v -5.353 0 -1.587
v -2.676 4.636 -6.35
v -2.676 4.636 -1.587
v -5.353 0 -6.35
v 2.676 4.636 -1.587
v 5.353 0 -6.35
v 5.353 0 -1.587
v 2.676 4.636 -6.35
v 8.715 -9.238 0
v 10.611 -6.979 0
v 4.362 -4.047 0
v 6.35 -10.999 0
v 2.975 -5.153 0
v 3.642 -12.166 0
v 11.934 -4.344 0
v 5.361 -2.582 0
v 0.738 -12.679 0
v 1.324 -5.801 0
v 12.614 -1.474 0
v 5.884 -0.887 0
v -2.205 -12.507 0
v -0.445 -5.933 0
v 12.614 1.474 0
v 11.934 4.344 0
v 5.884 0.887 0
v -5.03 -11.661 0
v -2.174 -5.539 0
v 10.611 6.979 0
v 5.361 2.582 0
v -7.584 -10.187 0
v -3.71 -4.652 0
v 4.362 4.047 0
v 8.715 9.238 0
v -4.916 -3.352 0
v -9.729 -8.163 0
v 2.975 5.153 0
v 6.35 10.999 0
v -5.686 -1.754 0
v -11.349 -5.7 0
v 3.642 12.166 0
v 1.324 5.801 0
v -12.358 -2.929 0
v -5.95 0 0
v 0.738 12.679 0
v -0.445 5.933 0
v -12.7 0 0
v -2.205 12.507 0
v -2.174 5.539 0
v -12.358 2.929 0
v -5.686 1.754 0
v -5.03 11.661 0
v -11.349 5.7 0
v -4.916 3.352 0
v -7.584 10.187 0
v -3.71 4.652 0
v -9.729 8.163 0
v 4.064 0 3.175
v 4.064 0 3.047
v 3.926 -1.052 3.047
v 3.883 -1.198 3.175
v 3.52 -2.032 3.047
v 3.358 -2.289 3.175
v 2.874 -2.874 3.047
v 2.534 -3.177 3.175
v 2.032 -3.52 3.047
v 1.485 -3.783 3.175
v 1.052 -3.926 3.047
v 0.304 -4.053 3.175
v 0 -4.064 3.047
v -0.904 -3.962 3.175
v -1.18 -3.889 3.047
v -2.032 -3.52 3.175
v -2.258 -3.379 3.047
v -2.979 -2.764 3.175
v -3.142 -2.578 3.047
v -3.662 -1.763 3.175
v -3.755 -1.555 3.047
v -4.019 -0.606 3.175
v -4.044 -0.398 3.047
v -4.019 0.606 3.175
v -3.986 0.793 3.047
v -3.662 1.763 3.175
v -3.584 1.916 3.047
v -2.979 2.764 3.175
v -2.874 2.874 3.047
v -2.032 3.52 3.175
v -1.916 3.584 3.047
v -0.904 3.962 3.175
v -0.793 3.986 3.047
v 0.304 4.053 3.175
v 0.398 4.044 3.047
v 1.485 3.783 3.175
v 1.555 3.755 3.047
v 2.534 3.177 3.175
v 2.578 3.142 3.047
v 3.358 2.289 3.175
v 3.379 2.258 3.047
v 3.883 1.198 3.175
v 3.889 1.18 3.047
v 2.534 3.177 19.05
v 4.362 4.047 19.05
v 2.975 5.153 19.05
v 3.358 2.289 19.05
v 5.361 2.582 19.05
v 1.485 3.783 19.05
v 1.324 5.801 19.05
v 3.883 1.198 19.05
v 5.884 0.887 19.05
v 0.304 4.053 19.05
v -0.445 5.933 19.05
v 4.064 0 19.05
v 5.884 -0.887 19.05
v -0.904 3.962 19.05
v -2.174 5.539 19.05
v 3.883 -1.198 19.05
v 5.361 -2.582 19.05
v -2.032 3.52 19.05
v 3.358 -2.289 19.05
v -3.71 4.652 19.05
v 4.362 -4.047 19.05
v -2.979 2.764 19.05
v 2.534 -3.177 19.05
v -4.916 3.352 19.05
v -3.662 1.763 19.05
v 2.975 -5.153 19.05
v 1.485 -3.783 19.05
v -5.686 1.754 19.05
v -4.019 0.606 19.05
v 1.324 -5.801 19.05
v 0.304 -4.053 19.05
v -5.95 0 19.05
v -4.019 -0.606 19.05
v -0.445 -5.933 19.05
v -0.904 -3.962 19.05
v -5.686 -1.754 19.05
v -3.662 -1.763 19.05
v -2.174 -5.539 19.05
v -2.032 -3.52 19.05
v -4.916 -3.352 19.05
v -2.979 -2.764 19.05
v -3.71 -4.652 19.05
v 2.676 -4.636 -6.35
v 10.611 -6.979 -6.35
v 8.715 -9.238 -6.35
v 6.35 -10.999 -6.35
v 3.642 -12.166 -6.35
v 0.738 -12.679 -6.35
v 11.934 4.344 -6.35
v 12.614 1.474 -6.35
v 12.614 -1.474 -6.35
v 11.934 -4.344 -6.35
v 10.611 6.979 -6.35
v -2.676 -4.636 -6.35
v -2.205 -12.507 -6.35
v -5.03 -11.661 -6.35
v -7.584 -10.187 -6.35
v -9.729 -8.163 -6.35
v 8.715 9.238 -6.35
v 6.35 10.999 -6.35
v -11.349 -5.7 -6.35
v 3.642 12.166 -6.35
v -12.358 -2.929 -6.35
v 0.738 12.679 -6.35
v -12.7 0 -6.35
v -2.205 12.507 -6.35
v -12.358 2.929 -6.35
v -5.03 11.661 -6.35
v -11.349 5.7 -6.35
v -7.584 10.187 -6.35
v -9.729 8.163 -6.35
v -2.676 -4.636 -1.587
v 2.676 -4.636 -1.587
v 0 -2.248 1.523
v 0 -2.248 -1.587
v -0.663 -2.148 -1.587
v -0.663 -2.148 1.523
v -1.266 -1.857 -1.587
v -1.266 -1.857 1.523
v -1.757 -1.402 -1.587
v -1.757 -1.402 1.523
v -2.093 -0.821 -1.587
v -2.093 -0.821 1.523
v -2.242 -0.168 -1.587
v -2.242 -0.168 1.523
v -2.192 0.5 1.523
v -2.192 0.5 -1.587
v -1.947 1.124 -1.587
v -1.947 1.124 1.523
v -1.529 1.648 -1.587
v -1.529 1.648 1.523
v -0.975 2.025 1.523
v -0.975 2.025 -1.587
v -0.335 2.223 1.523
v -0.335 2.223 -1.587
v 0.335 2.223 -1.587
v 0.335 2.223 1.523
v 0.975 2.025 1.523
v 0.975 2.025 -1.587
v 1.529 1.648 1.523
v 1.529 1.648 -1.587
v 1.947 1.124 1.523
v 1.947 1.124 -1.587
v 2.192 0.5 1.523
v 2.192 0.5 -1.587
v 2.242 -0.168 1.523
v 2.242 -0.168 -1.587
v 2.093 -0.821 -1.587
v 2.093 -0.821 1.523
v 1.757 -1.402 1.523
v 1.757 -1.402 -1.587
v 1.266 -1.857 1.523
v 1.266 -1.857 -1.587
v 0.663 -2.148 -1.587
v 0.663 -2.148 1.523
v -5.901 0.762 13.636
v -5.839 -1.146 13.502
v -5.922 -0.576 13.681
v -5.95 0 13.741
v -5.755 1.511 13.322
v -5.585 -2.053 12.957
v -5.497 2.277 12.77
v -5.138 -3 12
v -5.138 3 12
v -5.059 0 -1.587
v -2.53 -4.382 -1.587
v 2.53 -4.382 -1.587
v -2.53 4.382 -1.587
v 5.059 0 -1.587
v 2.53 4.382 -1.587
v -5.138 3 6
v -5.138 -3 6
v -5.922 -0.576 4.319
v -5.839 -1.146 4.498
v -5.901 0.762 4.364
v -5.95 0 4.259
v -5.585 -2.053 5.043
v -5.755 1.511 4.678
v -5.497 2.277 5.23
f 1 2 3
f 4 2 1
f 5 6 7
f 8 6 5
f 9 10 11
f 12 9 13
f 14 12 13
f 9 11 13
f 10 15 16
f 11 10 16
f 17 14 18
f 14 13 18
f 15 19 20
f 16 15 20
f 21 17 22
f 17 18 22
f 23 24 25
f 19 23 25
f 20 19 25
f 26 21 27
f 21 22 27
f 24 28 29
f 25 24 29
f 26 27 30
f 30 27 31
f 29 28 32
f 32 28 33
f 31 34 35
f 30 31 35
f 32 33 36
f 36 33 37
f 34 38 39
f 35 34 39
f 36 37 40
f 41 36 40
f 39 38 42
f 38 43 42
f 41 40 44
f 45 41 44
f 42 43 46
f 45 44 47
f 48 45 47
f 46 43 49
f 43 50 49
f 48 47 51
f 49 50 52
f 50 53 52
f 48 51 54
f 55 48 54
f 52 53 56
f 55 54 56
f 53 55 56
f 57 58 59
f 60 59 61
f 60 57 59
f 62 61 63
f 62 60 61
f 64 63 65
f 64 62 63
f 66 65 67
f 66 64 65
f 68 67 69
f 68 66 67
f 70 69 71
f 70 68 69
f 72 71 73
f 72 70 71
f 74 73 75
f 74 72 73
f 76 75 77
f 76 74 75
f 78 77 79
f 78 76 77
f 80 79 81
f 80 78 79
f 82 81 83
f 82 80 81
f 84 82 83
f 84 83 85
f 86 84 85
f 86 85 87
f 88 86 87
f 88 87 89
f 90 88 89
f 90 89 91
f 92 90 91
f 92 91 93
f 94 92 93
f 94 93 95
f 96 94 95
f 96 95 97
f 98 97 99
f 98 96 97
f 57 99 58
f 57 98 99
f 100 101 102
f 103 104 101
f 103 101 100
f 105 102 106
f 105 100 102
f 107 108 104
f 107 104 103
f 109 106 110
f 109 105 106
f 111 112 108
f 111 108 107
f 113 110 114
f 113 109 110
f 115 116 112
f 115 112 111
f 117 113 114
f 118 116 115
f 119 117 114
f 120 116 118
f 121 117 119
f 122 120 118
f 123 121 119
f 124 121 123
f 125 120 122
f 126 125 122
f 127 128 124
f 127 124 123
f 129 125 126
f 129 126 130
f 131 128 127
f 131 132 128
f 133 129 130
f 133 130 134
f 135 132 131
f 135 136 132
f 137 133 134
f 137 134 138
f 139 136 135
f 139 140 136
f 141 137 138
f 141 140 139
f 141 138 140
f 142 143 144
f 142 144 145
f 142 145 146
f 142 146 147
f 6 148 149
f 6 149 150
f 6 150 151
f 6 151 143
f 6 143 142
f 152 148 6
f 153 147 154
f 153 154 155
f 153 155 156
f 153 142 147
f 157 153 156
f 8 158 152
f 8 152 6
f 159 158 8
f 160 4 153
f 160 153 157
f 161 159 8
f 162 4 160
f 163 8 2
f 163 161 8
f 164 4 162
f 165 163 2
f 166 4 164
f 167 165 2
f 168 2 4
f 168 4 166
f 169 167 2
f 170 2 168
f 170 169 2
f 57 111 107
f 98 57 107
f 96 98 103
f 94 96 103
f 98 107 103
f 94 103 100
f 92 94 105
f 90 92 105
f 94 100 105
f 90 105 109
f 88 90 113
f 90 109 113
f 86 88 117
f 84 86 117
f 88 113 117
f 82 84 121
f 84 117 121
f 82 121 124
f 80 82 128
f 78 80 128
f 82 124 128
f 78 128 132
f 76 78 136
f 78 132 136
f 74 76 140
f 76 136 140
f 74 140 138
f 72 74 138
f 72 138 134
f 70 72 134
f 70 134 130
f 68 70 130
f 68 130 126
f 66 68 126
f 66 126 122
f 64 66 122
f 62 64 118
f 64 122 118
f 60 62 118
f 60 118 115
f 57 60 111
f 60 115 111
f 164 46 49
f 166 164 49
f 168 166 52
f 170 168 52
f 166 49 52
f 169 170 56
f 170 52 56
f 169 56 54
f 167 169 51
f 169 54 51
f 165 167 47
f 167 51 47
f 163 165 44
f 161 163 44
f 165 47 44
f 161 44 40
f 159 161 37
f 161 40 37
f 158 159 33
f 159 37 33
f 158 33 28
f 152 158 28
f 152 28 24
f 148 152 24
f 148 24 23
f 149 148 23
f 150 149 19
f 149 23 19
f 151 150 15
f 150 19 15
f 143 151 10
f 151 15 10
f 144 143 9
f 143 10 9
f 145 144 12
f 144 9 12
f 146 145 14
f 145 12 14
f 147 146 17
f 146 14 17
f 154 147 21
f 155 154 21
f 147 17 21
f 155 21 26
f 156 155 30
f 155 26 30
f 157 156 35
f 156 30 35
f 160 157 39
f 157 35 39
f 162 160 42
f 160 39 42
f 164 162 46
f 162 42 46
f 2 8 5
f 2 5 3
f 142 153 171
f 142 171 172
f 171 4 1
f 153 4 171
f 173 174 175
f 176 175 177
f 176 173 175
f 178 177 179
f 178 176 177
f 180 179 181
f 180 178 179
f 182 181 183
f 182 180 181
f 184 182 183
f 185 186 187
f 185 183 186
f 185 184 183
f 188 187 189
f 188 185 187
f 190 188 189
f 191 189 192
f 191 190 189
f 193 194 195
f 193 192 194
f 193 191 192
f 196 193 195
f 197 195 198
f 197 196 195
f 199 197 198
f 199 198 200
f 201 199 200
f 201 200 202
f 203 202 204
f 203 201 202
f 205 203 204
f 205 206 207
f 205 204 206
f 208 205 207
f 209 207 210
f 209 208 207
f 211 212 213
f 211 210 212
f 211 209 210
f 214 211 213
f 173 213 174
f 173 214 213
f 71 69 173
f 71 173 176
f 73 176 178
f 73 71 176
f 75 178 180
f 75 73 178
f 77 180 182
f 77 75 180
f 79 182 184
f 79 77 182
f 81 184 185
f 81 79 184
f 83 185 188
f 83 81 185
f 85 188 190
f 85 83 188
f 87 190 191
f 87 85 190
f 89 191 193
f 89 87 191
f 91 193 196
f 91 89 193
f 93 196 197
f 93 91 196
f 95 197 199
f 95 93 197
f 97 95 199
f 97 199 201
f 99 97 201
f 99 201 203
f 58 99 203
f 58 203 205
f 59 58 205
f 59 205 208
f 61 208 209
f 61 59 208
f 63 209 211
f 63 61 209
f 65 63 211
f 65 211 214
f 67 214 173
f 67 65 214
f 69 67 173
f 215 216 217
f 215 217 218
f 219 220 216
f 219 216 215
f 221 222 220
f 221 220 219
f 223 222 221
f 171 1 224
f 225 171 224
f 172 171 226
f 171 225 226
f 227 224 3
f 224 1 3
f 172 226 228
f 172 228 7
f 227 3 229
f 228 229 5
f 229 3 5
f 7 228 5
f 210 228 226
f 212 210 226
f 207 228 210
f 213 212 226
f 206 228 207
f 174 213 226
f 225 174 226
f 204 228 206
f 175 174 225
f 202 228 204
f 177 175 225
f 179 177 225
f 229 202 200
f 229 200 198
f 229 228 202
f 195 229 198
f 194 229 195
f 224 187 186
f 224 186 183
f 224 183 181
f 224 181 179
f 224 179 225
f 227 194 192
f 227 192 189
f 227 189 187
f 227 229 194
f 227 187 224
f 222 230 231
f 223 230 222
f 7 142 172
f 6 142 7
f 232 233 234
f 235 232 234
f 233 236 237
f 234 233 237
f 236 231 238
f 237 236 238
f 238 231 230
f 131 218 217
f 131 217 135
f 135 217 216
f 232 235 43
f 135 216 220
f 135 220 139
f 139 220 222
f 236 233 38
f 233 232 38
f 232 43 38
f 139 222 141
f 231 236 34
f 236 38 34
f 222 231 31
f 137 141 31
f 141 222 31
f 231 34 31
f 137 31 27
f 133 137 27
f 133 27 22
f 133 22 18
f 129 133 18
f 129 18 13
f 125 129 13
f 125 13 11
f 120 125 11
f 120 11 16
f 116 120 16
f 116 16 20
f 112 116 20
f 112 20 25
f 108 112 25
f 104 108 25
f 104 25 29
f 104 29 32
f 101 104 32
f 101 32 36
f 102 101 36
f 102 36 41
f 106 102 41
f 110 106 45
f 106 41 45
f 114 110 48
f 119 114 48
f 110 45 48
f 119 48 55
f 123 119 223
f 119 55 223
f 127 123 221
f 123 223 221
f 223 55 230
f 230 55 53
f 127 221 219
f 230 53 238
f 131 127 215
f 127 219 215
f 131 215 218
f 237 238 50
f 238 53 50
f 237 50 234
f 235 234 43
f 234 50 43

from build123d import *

# Parameters (mm, degrees)
SKETCH1_R           = 5.95
BOSS_EXTRUDE1_DEPTH = 19.05
SKETCH2_R           = 12.7
BOSS_EXTRUDE2_DEPTH = 6.35
SKETCH3_R           = 4.064
CUT_EXTRUDE1_DEPTH  = 15.875
BOSS_EXTRUDE3_REACH = 25.971
SKETCH7_R           = 4.2164
SKETCH7_R_2         = 4.064
CUT_EXTRUDE2_DEPTH  = 4.7625
MOVE_START          = -6.35
MOVE_FACE1_DEPTH    = 4.7625
SKETCH9_W           = 6
SKETCH9_H           = 6
CUT_EXTRUDE3_DEPTH  = 30.024106225
DRAFT1_ANGLE        = 65


# Read off the part's stored shape, not the designer's step: Move Face1
with BuildPart() as part:
    # Sketch1 → Boss-Extrude1 (new body)
    with BuildSketch(Plane.XY):
        with Locations(Location((0, 0, 0), (0, 0, 180))):
            Circle(SKETCH1_R)
    extrude(amount=BOSS_EXTRUDE1_DEPTH)

    # Sketch2 → Boss-Extrude2 (add)
    with BuildSketch(Plane(origin=(0, 0, 0), x_dir=(-1, 0, 0), z_dir=(0, 0, -1))):
        Circle(SKETCH2_R)
    extrude(amount=BOSS_EXTRUDE2_DEPTH)

    # Sketch3 → Cut-Extrude1 (cut)
    with BuildSketch(Plane.XY.offset(19.05)):
        Circle(SKETCH3_R)
    extrude(amount=-CUT_EXTRUDE1_DEPTH, mode=Mode.SUBTRACT)

    # Sketch6 → CSK for #8 Flat Head Machine Screw (100)1 (revolve, cut)
    with BuildSketch(Plane(origin=(0, 0, 3.175), x_dir=(0, -1, 0), z_dir=(1, 0, 0))):
        Polygon((0, 0), (0, 9.525), (2.2479, 9.525), (2.2479, 1.651767624), (4.2164, 0), align=None)
    revolve(axis=Axis((0, 0, 9.525), (0, 0, -1)), mode=Mode.SUBTRACT)

    # Sketch7 → Boss-Extrude3 (add, up to next)
    with BuildSketch(Plane(origin=(0, 0, 3.175), x_dir=(-1, 0, 0), z_dir=(0, 0, -1)), mode=Mode.PRIVATE) as boss_extrude3_sk1:
        Circle(SKETCH7_R)
        with Locations(Location((0, 0, 0), (0, 0, 180))):
            Circle(SKETCH7_R_2, mode=Mode.SUBTRACT)
    boss_extrude3_tool1 = extrude(boss_extrude3_sk1.sketch, amount=BOSS_EXTRUDE3_REACH, mode=Mode.PRIVATE) - part.part
    add(boss_extrude3_tool1.solids().sort_by_distance((4.097142, 0, 3.175))[0])

    # Sketch8 → Cut-Extrude2 (cut)
    with BuildSketch(Plane(origin=(0, 0, -6.35), x_dir=(-1, 0, 0), z_dir=(0, 0, -1))):
        Polygon((2.529660204, -4.3815), (5.059320409, 0), (2.529660204, 4.3815), (-2.529660204, 4.3815), (-5.059320409, 0), (-2.529660204, -4.3815), align=None)
    extrude(amount=-CUT_EXTRUDE2_DEPTH, mode=Mode.SUBTRACT)

    # Move Face1 outline → Move Face1 (cut)
    with BuildSketch(Plane.XY.offset(MOVE_START)):
        Polygon((-5.352614346, 0), (-2.676307173, -4.6355), (2.676307173, -4.6355), (5.352614346, 0), (2.676307173, 4.6355), (-2.676307173, 4.6355), align=None)
        Polygon((2.529660204, -4.3815), (-2.529660204, -4.3815), (-5.059320409, 0), (-2.529660204, 4.3815), (2.529660204, 4.3815), (5.059320409, 0), align=None, mode=Mode.SUBTRACT)
    extrude(amount=MOVE_FACE1_DEPTH, mode=Mode.SUBTRACT)

    # Sketch9 → Cut-Extrude3 (cut, through all)
    with BuildSketch(Plane.ZY.offset(5.138336307)):
        with Locations((9, 0)):
            Rectangle(SKETCH9_W, SKETCH9_H)
    extrude(amount=CUT_EXTRUDE3_DEPTH, mode=Mode.SUBTRACT)

    # Draft1
    draft1_faces = [part.faces().sort_by_distance(p)[0] for p in [
        (-5.464978006, 0, 12),
        (-5.464978006, 0, 6),
    ]]
    draft(draft1_faces, Plane(origin=(-5.138336307, 0, 0), x_dir=(0, 0, -1), z_dir=(-1, 0, 0)), DRAFT1_ANGLE)


solid = part.part
